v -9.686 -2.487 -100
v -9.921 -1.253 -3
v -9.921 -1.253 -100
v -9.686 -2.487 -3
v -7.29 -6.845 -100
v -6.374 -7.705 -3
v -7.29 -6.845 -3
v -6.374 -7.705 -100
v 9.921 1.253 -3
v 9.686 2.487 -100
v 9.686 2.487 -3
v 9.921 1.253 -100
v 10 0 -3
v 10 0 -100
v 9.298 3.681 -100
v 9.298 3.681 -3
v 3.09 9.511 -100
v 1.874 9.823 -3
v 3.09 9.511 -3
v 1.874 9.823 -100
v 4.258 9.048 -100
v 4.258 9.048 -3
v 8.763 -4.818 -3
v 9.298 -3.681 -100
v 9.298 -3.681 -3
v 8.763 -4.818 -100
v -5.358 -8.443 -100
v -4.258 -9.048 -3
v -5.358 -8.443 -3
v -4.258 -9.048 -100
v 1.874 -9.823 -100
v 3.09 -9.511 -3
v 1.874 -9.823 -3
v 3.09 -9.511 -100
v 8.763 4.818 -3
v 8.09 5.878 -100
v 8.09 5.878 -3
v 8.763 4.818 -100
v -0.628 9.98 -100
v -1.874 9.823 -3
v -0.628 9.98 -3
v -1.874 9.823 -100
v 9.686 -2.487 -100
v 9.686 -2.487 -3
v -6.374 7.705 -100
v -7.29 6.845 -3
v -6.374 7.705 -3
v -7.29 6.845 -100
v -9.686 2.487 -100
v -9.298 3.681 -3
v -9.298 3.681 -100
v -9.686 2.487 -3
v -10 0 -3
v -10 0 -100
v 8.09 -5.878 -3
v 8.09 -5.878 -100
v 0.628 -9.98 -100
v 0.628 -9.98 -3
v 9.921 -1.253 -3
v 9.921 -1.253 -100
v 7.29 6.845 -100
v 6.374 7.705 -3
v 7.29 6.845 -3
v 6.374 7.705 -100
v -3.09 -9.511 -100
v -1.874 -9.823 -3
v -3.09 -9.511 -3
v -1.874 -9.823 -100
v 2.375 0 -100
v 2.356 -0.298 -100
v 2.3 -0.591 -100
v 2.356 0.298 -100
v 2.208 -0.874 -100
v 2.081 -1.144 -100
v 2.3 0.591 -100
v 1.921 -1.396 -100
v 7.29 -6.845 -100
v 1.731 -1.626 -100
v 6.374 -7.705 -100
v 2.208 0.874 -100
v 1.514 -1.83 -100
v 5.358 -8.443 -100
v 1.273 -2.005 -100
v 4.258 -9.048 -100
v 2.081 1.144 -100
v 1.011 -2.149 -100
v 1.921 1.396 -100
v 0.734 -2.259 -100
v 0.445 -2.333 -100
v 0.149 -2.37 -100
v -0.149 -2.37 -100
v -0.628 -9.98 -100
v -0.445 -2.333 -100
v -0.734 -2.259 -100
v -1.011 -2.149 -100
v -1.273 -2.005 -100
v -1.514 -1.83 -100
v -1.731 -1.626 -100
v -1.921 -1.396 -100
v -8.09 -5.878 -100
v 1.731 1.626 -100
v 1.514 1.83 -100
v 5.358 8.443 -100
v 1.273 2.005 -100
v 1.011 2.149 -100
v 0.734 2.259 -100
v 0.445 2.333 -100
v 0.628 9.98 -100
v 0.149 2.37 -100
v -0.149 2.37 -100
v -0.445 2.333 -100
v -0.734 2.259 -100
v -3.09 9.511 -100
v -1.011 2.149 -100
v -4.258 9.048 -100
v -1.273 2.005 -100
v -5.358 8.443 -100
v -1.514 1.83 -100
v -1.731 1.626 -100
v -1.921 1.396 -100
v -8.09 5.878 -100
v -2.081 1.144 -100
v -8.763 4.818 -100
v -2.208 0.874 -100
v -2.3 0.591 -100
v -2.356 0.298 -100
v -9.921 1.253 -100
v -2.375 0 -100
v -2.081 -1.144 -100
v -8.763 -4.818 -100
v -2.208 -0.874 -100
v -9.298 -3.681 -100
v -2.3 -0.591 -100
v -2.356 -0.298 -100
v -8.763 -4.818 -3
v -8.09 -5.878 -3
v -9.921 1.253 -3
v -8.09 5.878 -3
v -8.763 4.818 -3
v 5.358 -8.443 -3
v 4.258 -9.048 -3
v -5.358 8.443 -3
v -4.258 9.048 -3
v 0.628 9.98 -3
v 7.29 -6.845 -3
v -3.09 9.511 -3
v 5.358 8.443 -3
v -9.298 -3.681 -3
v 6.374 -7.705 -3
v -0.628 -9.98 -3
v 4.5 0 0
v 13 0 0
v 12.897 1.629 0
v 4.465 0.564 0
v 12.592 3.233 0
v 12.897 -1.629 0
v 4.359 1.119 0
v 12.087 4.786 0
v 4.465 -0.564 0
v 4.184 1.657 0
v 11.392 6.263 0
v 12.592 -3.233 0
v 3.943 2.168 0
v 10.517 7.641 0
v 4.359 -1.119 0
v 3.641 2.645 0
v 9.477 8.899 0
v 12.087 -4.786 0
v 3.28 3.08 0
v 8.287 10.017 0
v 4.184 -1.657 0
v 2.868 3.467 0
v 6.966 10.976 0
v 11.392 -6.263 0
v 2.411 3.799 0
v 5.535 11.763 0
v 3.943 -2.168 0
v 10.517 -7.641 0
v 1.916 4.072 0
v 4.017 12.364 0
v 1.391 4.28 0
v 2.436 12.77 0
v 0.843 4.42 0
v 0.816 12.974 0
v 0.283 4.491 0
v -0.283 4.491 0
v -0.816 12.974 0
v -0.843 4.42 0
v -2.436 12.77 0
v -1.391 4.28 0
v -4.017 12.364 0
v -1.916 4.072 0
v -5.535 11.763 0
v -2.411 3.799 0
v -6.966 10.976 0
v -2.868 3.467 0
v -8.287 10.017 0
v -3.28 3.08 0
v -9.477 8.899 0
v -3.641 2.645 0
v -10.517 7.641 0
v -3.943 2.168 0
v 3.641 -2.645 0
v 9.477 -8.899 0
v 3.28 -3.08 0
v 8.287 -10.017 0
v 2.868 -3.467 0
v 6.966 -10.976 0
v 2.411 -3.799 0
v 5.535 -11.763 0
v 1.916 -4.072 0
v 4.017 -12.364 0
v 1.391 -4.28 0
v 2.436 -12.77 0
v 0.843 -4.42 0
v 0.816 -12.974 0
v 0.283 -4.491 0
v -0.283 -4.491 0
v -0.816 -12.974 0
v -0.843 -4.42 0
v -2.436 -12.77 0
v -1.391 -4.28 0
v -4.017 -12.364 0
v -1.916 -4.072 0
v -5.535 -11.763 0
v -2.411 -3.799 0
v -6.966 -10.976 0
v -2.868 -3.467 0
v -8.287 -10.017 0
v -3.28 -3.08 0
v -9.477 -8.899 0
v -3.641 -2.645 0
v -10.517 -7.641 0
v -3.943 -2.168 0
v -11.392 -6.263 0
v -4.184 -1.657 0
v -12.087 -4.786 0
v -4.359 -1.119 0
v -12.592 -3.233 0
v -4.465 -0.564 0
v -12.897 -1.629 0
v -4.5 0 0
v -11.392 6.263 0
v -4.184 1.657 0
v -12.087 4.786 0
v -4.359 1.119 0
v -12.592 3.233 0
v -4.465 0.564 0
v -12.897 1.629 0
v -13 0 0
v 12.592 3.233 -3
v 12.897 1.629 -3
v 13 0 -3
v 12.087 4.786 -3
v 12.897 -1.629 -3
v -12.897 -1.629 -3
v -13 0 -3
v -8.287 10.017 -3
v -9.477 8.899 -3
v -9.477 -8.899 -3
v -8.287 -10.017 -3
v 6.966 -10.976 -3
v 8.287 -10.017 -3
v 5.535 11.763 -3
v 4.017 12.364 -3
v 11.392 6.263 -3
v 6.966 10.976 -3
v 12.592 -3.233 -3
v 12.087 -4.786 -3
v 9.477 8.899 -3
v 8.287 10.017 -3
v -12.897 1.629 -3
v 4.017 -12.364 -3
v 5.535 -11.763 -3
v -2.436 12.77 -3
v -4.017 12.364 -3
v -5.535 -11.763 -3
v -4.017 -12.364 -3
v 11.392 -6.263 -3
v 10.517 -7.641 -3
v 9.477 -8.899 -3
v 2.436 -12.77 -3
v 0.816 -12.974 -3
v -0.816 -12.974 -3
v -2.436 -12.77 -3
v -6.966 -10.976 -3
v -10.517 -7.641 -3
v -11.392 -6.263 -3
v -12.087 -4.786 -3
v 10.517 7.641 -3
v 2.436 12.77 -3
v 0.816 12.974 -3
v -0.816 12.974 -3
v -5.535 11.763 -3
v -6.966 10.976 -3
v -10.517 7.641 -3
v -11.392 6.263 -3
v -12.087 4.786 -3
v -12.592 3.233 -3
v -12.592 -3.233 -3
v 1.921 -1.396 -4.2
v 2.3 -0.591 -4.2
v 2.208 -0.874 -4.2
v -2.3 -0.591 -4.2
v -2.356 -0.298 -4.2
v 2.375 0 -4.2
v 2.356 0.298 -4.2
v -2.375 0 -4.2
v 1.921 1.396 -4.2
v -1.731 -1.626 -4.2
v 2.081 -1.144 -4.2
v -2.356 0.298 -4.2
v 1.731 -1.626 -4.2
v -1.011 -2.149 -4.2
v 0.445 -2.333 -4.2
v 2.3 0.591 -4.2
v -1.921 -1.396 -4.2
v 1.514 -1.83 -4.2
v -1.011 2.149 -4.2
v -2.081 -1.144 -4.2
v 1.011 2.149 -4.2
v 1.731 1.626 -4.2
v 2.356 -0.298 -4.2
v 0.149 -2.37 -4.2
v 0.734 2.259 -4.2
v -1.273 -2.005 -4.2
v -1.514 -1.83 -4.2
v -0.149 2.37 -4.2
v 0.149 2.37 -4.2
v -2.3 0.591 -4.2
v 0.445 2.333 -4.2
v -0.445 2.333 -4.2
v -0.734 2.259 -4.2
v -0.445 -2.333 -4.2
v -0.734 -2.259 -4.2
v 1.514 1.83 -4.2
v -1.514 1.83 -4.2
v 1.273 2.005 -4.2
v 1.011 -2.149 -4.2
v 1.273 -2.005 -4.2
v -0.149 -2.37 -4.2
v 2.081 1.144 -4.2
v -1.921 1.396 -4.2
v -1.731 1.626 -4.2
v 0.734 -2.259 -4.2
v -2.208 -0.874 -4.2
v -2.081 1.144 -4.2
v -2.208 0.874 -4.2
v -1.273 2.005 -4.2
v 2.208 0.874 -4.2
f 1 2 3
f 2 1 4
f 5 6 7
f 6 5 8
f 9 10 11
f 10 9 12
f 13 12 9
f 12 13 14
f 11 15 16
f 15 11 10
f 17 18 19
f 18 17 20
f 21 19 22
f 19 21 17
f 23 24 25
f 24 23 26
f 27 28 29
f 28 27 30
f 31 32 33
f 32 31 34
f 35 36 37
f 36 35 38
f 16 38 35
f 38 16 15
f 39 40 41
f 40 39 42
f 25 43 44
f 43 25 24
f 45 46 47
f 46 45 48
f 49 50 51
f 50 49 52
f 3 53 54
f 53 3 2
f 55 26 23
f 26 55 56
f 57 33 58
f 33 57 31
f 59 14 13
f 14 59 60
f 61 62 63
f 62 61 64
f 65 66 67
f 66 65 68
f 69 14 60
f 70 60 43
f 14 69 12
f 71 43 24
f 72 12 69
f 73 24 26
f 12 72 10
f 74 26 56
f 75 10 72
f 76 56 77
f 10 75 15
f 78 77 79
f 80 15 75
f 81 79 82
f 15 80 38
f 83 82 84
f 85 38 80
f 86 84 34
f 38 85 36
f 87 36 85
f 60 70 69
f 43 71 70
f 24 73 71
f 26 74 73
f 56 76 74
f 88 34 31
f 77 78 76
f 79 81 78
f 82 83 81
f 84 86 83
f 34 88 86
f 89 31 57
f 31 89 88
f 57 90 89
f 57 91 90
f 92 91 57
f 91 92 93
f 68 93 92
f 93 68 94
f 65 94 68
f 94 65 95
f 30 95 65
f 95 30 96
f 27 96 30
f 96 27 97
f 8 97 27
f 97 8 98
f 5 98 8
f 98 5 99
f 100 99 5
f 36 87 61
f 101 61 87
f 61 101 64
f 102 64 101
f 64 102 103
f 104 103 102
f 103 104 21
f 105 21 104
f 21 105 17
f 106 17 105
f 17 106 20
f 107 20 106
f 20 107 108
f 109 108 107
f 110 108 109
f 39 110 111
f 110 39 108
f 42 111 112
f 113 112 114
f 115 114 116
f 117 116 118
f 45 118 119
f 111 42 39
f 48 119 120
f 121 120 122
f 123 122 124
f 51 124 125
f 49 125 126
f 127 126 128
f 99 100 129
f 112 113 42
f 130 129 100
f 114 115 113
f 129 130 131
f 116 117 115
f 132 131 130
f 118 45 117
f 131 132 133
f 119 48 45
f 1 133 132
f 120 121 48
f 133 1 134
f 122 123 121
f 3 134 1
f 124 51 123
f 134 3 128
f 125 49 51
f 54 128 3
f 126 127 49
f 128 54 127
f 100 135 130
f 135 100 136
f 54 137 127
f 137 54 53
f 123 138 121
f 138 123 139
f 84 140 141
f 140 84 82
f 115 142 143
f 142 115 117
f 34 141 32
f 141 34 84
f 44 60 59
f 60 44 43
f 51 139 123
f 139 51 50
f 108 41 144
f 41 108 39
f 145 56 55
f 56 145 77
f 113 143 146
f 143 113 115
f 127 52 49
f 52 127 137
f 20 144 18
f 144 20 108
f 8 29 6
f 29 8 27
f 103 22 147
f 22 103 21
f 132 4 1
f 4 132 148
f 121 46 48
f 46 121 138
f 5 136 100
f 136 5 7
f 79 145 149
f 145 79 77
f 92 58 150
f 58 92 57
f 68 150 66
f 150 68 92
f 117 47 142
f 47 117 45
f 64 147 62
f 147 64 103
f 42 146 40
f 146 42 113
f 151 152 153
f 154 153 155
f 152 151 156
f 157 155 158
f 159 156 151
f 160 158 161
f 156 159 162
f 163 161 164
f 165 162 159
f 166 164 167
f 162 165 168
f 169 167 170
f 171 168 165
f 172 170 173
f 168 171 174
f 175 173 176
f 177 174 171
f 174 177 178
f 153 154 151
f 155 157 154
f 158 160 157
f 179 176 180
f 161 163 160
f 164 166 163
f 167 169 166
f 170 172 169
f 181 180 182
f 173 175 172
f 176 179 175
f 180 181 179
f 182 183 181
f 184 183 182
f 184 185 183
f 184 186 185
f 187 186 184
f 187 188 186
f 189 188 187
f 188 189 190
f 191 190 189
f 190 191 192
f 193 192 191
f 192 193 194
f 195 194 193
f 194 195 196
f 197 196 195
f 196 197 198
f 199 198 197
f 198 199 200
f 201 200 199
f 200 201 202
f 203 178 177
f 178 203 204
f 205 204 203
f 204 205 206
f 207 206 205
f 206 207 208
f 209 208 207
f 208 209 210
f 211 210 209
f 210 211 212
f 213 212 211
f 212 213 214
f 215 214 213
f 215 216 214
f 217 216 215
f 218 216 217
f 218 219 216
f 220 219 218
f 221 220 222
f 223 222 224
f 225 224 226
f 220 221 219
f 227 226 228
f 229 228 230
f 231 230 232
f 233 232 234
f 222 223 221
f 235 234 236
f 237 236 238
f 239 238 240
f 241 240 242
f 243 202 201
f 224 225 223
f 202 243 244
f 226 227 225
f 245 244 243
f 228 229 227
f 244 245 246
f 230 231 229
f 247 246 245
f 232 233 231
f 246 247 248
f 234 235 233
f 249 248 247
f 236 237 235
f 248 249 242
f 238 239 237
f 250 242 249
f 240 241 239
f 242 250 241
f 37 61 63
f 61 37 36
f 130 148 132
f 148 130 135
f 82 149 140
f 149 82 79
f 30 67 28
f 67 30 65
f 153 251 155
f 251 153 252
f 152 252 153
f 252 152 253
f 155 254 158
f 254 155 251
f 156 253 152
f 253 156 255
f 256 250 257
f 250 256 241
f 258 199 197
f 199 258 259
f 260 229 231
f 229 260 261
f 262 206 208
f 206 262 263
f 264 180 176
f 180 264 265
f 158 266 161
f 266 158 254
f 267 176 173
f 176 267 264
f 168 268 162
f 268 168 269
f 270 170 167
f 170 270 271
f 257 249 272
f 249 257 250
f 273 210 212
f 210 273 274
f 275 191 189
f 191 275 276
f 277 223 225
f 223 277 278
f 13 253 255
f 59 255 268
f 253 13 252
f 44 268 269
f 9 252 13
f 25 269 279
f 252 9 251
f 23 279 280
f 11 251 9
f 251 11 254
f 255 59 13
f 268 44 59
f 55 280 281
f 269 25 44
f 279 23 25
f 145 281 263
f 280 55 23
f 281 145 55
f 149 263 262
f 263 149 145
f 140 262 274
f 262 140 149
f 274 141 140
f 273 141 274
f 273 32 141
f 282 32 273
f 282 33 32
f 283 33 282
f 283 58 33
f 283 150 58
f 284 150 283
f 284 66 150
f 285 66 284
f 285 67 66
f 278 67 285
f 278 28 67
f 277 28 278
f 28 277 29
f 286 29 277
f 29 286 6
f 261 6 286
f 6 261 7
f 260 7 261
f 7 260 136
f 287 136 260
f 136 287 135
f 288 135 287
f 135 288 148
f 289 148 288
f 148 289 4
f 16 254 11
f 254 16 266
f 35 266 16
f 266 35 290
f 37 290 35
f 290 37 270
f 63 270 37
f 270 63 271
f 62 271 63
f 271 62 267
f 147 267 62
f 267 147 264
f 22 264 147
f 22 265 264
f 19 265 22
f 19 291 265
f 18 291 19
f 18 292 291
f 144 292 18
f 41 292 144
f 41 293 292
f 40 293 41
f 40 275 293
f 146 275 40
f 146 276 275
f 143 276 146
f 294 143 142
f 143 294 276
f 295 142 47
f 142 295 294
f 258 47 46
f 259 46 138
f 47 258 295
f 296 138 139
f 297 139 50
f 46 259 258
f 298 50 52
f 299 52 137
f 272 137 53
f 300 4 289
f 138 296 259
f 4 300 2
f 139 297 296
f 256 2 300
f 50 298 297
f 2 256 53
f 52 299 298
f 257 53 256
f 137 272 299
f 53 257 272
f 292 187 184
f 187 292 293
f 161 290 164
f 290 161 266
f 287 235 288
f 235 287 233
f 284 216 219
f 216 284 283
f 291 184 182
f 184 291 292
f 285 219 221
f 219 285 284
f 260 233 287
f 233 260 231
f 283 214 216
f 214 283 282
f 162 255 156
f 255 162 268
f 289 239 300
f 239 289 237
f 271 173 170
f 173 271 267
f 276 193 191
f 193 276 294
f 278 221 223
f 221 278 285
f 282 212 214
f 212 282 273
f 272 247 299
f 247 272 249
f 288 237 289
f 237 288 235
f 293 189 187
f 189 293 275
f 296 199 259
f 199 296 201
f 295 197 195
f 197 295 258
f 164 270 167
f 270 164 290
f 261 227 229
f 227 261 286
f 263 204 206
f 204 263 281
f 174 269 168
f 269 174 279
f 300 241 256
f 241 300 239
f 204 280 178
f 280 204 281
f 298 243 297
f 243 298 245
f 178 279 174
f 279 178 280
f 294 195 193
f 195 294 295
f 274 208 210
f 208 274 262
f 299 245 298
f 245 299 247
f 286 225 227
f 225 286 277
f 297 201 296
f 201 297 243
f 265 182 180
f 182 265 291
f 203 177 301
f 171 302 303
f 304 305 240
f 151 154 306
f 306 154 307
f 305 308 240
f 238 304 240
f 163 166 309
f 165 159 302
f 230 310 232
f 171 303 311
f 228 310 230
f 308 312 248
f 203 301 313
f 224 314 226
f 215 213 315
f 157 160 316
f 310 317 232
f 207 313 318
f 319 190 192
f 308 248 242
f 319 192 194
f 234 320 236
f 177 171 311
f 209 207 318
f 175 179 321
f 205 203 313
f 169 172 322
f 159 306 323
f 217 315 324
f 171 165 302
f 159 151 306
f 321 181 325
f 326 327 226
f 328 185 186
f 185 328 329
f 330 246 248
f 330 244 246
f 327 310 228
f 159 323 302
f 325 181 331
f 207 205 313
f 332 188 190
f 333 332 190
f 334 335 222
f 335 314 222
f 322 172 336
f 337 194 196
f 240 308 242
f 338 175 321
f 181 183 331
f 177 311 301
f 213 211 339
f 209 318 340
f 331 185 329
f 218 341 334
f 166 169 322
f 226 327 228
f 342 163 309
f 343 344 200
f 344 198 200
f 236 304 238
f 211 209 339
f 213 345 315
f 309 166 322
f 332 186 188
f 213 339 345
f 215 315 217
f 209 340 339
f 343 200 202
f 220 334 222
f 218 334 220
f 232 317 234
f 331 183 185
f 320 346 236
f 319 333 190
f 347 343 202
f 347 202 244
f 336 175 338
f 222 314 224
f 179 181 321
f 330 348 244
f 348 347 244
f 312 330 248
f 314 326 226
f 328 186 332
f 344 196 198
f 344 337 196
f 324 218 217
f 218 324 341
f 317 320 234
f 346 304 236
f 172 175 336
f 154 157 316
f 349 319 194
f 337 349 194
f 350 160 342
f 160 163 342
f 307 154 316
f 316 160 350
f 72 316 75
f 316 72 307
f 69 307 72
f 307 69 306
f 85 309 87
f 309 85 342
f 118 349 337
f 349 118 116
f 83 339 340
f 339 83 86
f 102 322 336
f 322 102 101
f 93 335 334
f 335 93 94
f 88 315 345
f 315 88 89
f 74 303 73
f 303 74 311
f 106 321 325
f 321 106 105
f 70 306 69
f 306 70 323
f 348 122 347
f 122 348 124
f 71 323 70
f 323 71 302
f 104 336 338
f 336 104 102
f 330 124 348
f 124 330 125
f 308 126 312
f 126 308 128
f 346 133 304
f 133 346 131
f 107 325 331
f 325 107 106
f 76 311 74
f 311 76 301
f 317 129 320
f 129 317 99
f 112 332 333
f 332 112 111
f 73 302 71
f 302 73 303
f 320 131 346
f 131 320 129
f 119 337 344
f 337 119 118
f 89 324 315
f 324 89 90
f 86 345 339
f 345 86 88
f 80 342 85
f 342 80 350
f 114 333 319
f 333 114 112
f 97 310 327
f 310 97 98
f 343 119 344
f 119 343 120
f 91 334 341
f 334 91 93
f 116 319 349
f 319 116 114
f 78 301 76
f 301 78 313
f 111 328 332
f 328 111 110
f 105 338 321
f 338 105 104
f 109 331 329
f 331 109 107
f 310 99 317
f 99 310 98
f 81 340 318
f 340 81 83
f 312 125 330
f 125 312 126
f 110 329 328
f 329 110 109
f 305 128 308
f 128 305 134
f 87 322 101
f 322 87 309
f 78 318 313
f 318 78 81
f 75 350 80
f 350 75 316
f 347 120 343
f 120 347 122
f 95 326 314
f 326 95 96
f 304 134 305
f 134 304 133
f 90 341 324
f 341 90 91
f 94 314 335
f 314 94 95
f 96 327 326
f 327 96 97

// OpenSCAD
$fn = 50;


difference() {
	union() {
		translate(v = [0, 0, -100.0000000000]) {
			cylinder(h = 100, r = 10.0000000000);
		}
		translate(v = [0, 0, -3.0000000000]) {
			cylinder(h = 3, r = 13.0000000000);
		}
	}
	union() {
		translate(v = [0, 0, 0]) {
			rotate(a = [0, 0, 0]) {
				difference() {
					union() {
						#translate(v = [0, 0, -100.0000000000]) {
							cylinder(h = 100, r = 2.2500000000);
						}
						#translate(v = [0, 0, -4.2000000000]) {
							cylinder(h = 4.2000000000, r1 = 2.3750000000, r2 = 4.5000000000);
						}
						#translate(v = [0, 0, -100.0000000000]) {
							cylinder(h = 100, r = 2.3750000000);
						}
						#translate(v = [0, 0, -100.0000000000]) {
							cylinder(h = 100, r = 2.2500000000);
						}
					}
					union();
				}
			}
		}
	}
}
